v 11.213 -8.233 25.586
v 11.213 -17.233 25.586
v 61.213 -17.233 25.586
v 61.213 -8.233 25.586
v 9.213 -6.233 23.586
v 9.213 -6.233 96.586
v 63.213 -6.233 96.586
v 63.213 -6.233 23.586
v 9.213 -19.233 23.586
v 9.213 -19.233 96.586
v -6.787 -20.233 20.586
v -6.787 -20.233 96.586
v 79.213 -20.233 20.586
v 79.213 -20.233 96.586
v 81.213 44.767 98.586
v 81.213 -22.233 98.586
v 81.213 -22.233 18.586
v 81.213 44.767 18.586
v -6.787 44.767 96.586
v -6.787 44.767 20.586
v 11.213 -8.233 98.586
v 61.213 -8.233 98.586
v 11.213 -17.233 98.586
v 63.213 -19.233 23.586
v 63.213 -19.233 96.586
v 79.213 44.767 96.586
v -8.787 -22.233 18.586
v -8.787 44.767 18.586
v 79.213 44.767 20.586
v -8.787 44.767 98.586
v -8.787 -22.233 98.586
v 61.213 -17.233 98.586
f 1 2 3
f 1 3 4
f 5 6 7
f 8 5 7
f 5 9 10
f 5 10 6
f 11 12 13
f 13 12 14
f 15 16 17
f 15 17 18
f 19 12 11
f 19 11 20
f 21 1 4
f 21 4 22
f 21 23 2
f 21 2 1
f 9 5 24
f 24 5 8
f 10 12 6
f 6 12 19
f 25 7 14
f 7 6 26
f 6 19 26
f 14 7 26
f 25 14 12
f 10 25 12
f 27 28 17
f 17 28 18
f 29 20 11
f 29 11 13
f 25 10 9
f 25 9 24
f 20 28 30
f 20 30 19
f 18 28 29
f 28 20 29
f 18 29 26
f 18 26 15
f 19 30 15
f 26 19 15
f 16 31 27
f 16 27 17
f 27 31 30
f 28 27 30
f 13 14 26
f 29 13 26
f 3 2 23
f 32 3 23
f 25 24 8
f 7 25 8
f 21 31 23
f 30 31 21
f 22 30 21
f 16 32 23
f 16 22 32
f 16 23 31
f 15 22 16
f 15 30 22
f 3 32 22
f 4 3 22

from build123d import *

# Parameters (mm, degrees)
SKETCH1_W           = 90
SKETCH1_H           = 67
BOSS_EXTRUDE1_DEPTH = 40
SHELL1_T            = -2
SKETCH2_W           = 50
SKETCH2_H           = 13
CUT_EXTRUDE4_DEPTH  = 40
SKETCH4_W           = 54
SKETCH4_H           = 13
BOSS_EXTRUDE2_DEPTH = 75
SHELL2_START        = 11.213016769
SHELL2_OUTLINE_W    = 9
SHELL2_OUTLINE_H    = 73
SHELL2_DEPTH        = 50


# Read off the part's stored shape, not the designer's step: Shell2
with BuildPart() as part:
    # Sketch1 → Boss-Extrude1 (new, symmetric)
    with BuildSketch(Plane.XY.offset(58.585622103)):
        with Locations((36.213016769, 11.266964079)):
            Rectangle(SKETCH1_W, SKETCH1_H)
    extrude(amount=BOSS_EXTRUDE1_DEPTH, both=True)

    # Shell1
    shell1_openings = [part.faces().sort_by_distance(p)[0] for p in [
        (36.213016769, 44.766964079, 58.585622103),
    ]]
    offset(amount=SHELL1_T, openings=shell1_openings, kind=Kind.INTERSECTION)

    # Sketch2 → Cut-Extrude4 (cut)
    with BuildSketch(Plane.XY.offset(98.585622103)):
        with Locations((36.213016769, -12.733035921)):
            Rectangle(SKETCH2_W, SKETCH2_H)
    extrude(amount=-CUT_EXTRUDE4_DEPTH, mode=Mode.SUBTRACT)

    # Sketch4 → Boss-Extrude2 (add)
    with BuildSketch(Plane.XY.offset(98.585622103)):
        with Locations((36.213016769, -12.733035921)):
            Rectangle(SKETCH4_W, SKETCH4_H)
    extrude(amount=-BOSS_EXTRUDE2_DEPTH)

    # Shell2 outline → Shell2 (cut)
    with BuildSketch(Plane.YZ.offset(SHELL2_START)):
        with Locations((-12.733035921, 62.085622103)):
            Rectangle(SHELL2_OUTLINE_W, SHELL2_OUTLINE_H)
    extrude(amount=SHELL2_DEPTH, mode=Mode.SUBTRACT)


solid = part.part
